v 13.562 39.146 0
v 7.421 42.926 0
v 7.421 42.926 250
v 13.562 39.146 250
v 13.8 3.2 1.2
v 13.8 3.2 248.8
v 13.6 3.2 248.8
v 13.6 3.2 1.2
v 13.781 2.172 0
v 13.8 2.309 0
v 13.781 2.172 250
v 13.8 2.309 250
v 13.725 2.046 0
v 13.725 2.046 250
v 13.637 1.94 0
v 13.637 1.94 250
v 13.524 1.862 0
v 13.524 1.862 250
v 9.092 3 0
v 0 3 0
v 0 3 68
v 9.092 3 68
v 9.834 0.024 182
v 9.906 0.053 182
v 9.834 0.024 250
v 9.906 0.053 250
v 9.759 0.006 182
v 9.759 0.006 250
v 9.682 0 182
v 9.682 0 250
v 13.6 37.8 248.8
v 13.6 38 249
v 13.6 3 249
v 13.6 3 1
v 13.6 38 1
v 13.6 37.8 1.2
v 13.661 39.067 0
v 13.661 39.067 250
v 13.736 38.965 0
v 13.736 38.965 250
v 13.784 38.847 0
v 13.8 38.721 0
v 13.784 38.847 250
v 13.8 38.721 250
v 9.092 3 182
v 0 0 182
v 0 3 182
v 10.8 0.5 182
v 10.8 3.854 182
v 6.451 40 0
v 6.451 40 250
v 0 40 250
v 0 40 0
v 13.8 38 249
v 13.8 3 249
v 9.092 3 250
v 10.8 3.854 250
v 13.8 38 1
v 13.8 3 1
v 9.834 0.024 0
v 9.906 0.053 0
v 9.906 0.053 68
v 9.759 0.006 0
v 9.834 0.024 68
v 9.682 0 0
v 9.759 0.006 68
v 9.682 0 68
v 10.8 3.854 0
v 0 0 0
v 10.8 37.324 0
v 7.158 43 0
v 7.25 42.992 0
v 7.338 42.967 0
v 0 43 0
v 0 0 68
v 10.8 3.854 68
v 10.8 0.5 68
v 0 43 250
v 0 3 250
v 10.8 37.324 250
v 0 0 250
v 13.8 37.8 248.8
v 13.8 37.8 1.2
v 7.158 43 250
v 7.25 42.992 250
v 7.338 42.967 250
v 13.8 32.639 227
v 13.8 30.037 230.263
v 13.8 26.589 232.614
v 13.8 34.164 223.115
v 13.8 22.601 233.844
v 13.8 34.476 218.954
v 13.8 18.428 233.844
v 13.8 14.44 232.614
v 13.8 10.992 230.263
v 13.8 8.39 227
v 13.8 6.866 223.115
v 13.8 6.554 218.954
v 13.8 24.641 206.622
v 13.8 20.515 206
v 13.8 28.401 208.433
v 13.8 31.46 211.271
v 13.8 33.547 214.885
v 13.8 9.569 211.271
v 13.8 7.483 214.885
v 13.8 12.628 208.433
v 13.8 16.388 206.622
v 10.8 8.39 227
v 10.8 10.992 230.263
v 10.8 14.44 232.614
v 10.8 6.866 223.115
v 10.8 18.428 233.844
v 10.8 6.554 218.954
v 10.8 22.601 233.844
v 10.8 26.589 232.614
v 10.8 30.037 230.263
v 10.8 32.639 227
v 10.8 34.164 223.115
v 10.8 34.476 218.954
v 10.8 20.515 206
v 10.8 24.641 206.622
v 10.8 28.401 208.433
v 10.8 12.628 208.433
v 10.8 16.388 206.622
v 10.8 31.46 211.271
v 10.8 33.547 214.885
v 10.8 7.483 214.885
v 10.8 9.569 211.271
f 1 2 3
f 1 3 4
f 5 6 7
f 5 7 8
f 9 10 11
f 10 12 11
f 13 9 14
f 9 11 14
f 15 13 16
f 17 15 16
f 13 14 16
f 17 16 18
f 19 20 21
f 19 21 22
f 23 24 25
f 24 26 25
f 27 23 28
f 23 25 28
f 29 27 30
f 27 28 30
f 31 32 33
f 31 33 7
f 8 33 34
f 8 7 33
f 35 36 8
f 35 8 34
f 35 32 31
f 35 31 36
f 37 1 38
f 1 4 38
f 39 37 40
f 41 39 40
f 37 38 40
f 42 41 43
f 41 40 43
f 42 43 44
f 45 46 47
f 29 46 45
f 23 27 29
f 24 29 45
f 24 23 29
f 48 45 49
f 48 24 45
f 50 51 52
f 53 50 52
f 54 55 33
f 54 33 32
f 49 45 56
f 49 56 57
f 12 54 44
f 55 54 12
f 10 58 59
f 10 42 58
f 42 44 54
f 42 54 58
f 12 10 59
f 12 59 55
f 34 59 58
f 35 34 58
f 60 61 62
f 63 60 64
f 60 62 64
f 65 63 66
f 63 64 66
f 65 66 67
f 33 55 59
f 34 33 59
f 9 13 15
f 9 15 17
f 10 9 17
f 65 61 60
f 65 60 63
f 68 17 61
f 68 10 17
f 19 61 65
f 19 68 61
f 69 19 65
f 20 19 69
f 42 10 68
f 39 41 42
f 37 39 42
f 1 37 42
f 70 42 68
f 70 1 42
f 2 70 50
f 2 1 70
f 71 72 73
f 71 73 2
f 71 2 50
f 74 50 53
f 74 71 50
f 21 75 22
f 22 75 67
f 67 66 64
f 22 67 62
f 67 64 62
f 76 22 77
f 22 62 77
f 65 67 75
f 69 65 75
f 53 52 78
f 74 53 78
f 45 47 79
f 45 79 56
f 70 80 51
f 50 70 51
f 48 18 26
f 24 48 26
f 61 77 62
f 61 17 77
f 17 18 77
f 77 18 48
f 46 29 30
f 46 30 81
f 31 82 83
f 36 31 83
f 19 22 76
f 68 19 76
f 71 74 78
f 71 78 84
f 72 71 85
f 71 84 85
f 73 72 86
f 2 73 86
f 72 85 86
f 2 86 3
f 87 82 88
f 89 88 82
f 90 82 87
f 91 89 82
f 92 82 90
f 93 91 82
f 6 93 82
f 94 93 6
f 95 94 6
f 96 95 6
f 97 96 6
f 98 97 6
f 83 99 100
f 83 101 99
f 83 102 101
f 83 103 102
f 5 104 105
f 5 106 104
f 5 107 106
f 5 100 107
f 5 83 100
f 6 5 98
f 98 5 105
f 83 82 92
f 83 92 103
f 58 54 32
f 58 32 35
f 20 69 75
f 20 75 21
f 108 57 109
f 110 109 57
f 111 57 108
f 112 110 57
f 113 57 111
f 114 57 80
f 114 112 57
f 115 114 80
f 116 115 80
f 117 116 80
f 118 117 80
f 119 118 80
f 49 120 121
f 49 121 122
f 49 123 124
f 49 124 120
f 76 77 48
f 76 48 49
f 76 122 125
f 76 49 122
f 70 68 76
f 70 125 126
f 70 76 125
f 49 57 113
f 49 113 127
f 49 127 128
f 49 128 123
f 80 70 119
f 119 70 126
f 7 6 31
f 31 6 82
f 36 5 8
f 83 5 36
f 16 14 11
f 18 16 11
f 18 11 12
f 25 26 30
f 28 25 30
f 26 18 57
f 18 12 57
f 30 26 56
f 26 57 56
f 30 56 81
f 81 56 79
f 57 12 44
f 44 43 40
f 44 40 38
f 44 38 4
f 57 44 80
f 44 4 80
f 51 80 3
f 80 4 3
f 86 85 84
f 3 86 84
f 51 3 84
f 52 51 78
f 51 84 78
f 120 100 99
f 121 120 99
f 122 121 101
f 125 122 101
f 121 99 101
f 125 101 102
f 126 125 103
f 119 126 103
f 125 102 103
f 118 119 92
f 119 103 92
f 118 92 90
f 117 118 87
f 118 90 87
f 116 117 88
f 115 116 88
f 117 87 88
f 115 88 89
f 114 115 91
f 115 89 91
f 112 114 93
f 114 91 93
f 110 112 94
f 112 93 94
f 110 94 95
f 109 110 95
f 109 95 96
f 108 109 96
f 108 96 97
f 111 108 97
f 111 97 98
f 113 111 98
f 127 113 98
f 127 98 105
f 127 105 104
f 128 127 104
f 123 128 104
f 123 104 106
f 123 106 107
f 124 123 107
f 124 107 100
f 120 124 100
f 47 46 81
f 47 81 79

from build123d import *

# Parameters (mm, degrees)
BOSS_EXTRUDE1_DEPTH = 250
CUT_EXTRUDE1_REACH  = 45
SKETCH2_W           = 10.8
SKETCH2_H           = 114
SKETCH3_W           = 248
SKETCH3_H           = 35
SKETCH3_W_2         = 247.6
SKETCH3_H_2         = 34.6
CUT_EXTRUDE2_DEPTH  = 0.2
FILLET1_R           = 0.5
SKETCH4_R           = 14
CUT_EXTRUDE3_DEPTH  = 14.8


with BuildPart() as part:
    # Sketch1 → Boss-Extrude1 (new body)
    with BuildSketch(Plane.XY):
        Polygon((0, 3), (9.091796068, 3), (10.8, 3.854101966), (10.8, 37.323614418), (6.450873429, 40), (0, 40), (0, 43), (7.3, 43), (13.8, 39), (13.8, 2), (9.8, 0), (0, 0), align=None)
    extrude(amount=BOSS_EXTRUDE1_DEPTH)

    # Sketch2 → Cut-Extrude1 (cut, up to next)
    with BuildSketch(Plane.XZ, mode=Mode.PRIVATE) as cut_extrude1_sk1:
        with Locations((5.4, 125)):
            Rectangle(SKETCH2_W, SKETCH2_H)
    cut_extrude1_tool1 = extrude(cut_extrude1_sk1.sketch, amount=-CUT_EXTRUDE1_REACH, mode=Mode.PRIVATE) & part.part
    add(cut_extrude1_tool1.solids().sort_by_distance((5.4, 0, 125))[0], mode=Mode.SUBTRACT)

    # Sketch3 → Cut-Extrude2 (cut)
    with BuildSketch(Plane(origin=(13.8, 0, 0), x_dir=(0, 0, -1), z_dir=(1, 0, 0))):
        with Locations((-125, 20.5)):
            Rectangle(SKETCH3_W, SKETCH3_H)
        with Locations((-125, 20.5)):
            Rectangle(SKETCH3_W_2, SKETCH3_H_2, mode=Mode.SUBTRACT)
    extrude(amount=-CUT_EXTRUDE2_DEPTH, mode=Mode.SUBTRACT)

    # Fillet1
    fillet1_edges = [part.edges().sort_by_distance(p)[0] for p in [
        (13.8, 39, 125),
        (13.8, 2, 125),
        (9.8, 0, 216),
        (7.3, 43, 125),
        (9.8, 0, 34),
    ]]
    fillet(fillet1_edges, radius=FILLET1_R)

    # Sketch4 → Cut-Extrude3 (cut, through all)
    with BuildSketch(Plane(origin=(13.8, 0, 0), x_dir=(0, 0, -1), z_dir=(1, 0, 0))):
        with Locations((-220, 20.514809699)):
            Circle(SKETCH4_R)
    extrude(amount=-CUT_EXTRUDE3_DEPTH, mode=Mode.SUBTRACT)


solid = part.part
